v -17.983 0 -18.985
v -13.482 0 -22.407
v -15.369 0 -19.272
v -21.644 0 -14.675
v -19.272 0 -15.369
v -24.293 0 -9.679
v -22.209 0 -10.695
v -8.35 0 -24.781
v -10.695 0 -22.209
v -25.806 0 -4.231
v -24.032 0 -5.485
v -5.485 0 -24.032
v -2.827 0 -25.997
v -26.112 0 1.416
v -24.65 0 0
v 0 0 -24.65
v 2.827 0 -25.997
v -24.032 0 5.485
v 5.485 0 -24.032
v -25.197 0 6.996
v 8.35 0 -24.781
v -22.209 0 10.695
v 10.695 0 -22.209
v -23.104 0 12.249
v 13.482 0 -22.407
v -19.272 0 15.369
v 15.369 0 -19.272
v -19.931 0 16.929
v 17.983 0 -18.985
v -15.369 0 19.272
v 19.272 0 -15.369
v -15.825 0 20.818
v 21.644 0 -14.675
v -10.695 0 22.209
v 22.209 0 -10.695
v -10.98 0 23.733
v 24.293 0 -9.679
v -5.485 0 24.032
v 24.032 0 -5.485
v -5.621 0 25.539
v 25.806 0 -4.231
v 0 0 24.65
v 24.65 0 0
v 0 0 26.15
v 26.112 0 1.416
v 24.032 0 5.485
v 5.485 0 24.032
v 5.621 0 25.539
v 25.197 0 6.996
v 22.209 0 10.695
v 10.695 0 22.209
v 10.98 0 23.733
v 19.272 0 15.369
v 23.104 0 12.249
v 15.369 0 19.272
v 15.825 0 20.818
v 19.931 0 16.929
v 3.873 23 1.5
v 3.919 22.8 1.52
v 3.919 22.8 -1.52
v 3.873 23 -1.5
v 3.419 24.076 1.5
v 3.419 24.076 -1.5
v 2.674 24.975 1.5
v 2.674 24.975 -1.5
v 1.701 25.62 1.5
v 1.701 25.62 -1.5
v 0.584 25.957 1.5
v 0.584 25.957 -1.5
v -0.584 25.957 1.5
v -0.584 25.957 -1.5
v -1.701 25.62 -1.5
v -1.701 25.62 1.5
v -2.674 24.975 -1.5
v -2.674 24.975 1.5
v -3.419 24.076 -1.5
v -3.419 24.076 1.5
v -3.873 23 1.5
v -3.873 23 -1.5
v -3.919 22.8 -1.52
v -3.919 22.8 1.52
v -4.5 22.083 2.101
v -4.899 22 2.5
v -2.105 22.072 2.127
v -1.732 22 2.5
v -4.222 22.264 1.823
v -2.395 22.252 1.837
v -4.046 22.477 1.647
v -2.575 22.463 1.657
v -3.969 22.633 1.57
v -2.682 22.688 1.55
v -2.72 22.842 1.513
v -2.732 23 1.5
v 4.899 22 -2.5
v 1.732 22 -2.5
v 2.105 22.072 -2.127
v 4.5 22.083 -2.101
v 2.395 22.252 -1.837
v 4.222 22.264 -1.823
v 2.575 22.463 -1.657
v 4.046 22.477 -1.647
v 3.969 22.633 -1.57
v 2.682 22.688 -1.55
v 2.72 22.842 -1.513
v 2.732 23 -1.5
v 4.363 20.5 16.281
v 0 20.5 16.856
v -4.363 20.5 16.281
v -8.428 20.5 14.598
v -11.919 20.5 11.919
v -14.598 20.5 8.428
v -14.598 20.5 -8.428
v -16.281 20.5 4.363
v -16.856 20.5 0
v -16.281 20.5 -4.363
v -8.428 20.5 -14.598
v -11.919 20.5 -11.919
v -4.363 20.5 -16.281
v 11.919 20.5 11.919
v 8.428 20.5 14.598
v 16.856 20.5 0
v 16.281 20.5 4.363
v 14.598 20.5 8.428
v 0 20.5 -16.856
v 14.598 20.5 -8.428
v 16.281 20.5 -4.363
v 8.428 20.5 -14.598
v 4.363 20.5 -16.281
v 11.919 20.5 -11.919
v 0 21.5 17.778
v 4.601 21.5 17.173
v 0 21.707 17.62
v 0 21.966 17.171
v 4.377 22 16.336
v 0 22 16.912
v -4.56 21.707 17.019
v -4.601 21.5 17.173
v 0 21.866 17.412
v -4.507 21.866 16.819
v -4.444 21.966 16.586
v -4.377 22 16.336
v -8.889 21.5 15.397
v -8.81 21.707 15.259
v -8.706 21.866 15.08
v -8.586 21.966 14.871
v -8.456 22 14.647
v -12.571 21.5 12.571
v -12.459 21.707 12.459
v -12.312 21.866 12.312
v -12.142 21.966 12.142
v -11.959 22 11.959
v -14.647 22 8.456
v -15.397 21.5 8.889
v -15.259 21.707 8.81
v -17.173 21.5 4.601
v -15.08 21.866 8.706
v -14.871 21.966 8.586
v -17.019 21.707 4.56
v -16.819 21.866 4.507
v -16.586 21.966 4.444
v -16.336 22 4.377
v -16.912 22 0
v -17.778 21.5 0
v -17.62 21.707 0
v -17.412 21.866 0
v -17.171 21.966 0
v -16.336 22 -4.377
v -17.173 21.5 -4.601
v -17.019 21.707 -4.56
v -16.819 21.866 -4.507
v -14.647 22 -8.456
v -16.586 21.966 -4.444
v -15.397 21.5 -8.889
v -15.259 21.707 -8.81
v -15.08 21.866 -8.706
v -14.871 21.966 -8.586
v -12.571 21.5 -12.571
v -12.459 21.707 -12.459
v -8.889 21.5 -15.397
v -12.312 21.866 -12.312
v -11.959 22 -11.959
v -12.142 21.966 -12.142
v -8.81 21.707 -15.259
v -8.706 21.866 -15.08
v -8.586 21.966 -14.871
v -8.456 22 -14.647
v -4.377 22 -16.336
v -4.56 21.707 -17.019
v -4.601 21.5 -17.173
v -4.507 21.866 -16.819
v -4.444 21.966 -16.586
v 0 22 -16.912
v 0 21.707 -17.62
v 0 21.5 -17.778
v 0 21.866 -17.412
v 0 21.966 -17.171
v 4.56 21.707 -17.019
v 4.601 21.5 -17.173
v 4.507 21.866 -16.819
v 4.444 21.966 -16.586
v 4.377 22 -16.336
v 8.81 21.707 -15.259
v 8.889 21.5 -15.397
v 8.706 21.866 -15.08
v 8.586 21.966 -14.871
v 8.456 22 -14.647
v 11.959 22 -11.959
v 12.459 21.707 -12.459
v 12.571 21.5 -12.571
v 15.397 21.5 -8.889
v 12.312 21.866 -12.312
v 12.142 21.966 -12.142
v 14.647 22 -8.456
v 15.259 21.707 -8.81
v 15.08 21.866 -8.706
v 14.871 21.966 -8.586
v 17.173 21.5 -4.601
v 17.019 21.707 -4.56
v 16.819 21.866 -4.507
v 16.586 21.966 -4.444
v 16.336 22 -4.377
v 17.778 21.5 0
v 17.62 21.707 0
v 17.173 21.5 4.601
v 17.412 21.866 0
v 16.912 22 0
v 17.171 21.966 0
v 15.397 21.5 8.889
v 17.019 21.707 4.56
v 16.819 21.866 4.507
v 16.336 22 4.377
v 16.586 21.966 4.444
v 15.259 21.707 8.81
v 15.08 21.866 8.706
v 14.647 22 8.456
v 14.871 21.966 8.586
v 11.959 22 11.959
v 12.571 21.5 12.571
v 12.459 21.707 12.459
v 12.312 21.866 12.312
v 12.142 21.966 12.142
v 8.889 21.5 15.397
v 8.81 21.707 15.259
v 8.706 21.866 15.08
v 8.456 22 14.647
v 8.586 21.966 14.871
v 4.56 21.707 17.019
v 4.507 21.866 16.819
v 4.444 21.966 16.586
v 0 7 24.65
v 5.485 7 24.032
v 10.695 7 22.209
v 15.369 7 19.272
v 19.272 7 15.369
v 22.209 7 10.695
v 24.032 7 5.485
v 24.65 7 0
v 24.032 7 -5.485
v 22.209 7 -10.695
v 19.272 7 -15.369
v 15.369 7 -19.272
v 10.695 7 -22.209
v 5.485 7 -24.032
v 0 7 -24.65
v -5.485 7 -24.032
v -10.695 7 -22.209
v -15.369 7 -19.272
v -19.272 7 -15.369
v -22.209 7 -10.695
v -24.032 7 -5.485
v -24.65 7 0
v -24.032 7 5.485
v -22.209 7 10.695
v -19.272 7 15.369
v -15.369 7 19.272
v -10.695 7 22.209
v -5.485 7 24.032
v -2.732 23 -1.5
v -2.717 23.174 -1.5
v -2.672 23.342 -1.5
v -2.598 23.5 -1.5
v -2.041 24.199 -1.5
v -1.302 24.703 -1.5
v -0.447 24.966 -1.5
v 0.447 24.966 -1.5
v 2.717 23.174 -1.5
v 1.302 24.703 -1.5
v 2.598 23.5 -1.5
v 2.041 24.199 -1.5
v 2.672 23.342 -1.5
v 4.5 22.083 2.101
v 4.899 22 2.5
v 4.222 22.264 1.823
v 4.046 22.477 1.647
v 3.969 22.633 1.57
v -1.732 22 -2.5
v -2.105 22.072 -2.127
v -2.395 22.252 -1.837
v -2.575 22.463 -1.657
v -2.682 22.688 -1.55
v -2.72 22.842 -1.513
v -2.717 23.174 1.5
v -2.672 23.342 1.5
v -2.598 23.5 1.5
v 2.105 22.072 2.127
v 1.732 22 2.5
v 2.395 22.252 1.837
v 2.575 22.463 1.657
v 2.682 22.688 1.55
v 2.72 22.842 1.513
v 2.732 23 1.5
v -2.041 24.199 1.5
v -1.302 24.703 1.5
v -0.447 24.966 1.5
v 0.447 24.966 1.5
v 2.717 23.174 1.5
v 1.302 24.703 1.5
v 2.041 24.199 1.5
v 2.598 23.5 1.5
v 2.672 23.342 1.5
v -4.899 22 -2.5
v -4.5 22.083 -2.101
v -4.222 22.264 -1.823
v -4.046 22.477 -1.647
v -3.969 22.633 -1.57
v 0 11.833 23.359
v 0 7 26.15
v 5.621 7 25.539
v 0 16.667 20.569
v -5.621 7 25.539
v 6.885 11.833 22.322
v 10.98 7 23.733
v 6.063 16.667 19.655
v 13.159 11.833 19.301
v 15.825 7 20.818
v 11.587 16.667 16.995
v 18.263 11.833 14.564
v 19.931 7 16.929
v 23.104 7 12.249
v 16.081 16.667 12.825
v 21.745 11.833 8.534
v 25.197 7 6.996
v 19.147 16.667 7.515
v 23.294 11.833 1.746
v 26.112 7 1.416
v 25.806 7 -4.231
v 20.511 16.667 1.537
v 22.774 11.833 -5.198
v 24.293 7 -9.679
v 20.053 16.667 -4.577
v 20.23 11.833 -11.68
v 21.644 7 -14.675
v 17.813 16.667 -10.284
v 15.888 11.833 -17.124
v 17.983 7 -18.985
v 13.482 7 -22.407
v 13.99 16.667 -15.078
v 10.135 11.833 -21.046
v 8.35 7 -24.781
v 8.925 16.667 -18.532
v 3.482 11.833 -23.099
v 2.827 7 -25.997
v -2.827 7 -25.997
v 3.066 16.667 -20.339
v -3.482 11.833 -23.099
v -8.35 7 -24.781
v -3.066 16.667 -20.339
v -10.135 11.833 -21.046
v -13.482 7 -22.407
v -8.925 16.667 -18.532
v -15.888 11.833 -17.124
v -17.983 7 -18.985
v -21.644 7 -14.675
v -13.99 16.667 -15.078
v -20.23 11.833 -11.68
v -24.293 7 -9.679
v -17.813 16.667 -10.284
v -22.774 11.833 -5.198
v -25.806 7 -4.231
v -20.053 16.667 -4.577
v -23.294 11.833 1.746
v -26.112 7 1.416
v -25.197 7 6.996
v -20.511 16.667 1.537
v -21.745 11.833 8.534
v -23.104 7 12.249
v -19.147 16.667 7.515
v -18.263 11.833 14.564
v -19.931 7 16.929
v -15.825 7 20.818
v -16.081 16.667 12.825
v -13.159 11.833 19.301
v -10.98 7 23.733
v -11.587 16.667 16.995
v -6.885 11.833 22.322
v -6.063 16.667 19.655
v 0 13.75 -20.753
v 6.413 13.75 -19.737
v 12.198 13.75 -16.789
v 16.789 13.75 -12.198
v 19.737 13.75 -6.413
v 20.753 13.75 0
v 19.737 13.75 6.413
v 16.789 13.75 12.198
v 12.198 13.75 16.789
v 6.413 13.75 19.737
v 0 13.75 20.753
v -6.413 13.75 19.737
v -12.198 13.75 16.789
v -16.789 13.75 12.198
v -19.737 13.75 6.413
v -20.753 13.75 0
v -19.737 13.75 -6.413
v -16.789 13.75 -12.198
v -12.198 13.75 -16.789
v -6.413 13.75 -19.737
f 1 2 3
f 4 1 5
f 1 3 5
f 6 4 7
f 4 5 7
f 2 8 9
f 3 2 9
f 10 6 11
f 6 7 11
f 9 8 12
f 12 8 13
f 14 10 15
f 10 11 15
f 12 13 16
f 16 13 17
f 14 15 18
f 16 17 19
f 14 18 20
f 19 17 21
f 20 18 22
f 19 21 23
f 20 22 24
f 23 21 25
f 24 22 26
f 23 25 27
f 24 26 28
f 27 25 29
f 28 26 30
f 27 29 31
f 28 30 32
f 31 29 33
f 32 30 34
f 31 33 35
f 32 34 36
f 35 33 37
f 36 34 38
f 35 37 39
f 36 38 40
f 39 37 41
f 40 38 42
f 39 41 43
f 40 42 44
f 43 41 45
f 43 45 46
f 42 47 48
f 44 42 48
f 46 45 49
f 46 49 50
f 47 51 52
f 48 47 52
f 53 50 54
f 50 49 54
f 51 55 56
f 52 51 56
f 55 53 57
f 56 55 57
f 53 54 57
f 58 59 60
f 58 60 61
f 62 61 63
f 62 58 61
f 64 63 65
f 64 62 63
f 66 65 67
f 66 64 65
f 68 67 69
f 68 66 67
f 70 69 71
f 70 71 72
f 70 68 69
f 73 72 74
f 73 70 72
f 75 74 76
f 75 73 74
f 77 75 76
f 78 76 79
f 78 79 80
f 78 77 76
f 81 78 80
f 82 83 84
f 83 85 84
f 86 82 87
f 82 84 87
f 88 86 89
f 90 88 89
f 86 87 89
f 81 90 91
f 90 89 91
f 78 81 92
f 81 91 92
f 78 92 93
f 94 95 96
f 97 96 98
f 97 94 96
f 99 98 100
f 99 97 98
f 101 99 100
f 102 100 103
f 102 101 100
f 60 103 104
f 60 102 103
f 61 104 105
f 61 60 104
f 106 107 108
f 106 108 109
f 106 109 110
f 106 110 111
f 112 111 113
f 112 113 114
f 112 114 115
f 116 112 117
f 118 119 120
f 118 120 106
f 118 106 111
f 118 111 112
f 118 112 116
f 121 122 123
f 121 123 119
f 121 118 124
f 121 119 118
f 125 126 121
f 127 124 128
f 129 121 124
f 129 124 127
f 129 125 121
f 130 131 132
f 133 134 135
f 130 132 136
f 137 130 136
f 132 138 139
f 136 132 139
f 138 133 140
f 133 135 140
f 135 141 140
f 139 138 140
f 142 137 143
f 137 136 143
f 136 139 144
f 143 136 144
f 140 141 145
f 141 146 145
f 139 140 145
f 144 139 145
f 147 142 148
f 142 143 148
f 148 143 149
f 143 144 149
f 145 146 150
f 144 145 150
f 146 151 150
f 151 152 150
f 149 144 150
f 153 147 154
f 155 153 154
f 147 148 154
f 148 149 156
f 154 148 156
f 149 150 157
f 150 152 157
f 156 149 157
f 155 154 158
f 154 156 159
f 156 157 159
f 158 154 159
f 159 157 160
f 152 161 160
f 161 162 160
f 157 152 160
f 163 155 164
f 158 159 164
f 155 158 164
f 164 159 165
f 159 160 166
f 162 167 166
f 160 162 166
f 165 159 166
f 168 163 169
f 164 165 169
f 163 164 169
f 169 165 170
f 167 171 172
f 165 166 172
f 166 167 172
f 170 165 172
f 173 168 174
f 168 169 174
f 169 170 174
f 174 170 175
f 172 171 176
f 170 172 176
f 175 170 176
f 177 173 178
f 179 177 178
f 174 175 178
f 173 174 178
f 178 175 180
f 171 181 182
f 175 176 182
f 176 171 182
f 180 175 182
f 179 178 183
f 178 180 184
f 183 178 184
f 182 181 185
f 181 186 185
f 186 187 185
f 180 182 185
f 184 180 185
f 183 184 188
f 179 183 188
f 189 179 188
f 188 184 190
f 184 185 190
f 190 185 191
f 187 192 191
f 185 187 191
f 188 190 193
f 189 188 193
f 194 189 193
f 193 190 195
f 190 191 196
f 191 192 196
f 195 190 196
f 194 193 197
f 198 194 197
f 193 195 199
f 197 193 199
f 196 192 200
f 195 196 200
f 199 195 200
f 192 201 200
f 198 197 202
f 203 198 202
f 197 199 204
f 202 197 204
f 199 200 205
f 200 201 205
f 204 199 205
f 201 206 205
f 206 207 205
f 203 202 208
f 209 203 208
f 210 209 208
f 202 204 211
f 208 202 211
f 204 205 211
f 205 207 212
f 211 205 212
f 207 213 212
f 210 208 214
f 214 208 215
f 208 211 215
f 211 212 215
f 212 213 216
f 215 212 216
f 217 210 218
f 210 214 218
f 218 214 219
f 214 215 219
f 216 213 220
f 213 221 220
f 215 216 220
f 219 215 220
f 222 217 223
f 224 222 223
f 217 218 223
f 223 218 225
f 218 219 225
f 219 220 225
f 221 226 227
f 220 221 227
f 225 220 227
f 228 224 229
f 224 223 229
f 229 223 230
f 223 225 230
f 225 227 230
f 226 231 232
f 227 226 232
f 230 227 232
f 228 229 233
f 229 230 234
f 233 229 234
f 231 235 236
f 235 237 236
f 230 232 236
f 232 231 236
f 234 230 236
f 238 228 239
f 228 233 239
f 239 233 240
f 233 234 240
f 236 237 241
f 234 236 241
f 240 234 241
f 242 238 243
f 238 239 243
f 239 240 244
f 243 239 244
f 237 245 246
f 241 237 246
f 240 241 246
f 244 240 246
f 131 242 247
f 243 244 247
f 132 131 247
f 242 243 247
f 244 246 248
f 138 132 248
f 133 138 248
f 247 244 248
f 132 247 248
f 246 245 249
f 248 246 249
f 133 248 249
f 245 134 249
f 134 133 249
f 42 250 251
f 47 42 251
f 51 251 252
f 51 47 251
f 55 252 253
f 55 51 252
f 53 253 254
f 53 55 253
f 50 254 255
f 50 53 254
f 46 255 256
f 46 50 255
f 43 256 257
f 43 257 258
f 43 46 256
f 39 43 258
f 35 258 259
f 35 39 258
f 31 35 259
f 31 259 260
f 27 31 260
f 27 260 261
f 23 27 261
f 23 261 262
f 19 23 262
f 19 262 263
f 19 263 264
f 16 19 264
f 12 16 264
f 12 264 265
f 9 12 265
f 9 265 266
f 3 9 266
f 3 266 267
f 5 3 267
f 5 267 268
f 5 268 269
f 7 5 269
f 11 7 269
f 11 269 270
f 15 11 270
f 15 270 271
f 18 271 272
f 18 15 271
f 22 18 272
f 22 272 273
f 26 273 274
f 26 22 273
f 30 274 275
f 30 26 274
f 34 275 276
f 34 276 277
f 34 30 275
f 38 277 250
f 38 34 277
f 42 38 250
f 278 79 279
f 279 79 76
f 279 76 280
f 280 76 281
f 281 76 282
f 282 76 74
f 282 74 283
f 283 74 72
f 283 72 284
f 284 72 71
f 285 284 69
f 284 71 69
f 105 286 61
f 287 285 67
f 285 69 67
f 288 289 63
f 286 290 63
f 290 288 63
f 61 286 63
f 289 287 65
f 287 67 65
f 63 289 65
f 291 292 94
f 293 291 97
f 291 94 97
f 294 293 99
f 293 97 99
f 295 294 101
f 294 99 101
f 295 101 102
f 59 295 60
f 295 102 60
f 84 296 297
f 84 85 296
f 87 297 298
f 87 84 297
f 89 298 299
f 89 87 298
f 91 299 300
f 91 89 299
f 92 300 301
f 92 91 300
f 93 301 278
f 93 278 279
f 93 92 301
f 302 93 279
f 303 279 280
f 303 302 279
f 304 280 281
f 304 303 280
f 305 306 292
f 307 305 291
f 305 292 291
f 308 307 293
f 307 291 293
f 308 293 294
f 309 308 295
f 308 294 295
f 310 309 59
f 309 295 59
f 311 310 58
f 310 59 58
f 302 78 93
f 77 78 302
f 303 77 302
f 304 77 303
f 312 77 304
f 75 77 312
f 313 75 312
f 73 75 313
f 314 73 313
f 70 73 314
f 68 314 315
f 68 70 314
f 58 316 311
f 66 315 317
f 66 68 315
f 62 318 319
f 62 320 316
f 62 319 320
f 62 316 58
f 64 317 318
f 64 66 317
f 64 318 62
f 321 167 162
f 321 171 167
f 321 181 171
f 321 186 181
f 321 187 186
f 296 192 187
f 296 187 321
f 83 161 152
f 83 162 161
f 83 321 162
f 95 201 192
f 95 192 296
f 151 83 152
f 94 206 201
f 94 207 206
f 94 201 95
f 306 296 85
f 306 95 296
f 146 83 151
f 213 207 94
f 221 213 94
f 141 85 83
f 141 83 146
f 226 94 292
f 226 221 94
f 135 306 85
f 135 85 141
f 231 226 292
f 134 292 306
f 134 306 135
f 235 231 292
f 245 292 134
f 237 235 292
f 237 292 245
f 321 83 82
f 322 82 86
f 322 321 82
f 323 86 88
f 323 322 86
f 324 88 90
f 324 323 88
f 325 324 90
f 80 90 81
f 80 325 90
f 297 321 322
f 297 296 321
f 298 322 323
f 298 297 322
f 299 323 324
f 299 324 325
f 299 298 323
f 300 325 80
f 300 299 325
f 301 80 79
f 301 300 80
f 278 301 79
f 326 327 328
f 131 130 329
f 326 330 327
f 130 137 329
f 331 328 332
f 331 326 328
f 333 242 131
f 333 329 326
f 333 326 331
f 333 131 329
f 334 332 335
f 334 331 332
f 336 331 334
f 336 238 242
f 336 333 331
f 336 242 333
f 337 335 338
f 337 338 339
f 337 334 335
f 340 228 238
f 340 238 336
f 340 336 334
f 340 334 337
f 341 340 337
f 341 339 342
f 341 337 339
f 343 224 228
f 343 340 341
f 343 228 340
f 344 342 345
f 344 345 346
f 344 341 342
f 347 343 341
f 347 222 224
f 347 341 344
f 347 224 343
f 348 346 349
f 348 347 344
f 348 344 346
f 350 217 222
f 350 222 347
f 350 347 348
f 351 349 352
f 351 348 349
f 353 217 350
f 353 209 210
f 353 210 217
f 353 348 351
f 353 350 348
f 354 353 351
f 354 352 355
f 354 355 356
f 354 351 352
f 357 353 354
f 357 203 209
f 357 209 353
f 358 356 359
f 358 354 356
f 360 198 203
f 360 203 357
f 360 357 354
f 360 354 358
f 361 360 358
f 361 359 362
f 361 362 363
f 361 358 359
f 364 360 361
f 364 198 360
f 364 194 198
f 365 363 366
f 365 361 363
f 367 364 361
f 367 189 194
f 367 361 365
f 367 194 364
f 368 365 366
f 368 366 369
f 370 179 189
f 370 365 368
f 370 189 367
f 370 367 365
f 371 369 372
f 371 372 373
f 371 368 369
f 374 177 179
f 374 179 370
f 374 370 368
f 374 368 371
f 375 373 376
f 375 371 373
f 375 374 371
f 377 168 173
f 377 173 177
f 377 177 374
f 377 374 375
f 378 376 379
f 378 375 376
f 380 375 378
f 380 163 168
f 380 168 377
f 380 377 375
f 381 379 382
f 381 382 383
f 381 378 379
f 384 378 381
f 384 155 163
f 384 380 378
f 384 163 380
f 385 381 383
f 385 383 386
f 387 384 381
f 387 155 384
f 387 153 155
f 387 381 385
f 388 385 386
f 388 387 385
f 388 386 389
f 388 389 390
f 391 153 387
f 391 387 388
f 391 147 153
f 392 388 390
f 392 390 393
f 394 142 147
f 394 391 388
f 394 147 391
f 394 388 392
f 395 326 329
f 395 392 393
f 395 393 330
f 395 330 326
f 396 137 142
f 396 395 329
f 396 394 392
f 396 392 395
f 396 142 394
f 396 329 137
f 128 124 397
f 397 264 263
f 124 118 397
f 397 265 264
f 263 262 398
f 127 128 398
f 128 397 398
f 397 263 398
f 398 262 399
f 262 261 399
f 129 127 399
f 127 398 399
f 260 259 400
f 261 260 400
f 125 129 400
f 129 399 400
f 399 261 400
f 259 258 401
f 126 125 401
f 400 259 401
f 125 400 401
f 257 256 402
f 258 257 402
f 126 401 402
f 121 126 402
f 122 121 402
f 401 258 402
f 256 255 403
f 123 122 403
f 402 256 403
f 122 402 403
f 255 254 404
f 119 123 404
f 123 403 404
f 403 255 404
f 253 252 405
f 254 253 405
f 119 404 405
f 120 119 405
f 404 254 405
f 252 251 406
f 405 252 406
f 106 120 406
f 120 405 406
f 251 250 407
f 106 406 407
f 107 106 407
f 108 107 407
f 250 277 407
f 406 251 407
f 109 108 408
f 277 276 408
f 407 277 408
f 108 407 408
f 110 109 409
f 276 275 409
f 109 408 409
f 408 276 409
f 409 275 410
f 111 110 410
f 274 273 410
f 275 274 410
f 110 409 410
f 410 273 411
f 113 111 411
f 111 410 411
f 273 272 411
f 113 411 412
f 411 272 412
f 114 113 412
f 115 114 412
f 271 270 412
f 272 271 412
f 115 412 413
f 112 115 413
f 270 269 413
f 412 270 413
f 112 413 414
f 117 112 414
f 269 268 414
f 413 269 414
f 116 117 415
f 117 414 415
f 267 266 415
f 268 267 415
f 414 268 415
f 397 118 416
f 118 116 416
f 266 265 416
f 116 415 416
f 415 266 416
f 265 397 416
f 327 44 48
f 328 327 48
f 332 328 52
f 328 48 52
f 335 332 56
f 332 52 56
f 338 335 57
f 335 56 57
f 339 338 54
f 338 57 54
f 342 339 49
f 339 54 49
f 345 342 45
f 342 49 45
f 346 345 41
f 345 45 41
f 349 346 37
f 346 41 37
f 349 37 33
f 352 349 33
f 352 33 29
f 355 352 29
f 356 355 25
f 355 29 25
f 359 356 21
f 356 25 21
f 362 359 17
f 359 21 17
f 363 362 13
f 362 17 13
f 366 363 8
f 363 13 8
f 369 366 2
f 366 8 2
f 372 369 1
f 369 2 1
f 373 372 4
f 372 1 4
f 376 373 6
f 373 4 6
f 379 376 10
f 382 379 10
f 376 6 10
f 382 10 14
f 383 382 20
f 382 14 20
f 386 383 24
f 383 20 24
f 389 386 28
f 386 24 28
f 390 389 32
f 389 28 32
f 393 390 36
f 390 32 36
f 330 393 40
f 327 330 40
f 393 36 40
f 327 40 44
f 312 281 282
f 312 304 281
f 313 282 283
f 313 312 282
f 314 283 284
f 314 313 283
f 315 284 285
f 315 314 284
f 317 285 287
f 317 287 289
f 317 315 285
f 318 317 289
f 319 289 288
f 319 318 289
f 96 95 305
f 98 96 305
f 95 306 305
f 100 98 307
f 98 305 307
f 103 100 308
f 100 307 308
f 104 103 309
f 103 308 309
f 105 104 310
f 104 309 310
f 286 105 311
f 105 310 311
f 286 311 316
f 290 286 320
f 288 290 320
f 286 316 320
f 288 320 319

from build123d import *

# Parameters (mm, degrees)
SKETCH1_R           = 26.15
SKETCH1_R_2         = 24.65
BOSS_EXTRUDE1_DEPTH = 7
SKETCH3_R           = 26.15
BOSS_EXTRUDE2_DEPTH = 15
BOSS_EXTRUDE2_TAPER = 30
SKETCH4_R           = 24.65
CUT_EXTRUDE1_DEPTH  = 13.5
CUT_EXTRUDE1_DRAFT  = -30
BOSS_EXTRUDE4_DEPTH = 1.5
FILLET2_R           = 1


with BuildPart() as part:
    # Sketch1 → Boss-Extrude1 (new body)
    with BuildSketch(Plane(origin=(0, 0, 0), x_dir=(1, 0, 0), z_dir=(0, 1, 0))):
        with Locations(Location((0, 0, 0), (0, 0, 270))):
            Circle(SKETCH1_R)
        with Locations(Location((0, 0, 0), (0, 0, 270))):
            Circle(SKETCH1_R_2, mode=Mode.SUBTRACT)
    extrude(amount=BOSS_EXTRUDE1_DEPTH)

    # Sketch3 → Boss-Extrude2 (add)
    with BuildSketch(Plane(origin=(0, 7, 0), x_dir=(1, 0, 0), z_dir=(0, 1, 0))):
        with Locations(Location((0, 0, 0), (0, 0, 270))):
            Circle(SKETCH3_R)
    extrude(amount=BOSS_EXTRUDE2_DEPTH, taper=BOSS_EXTRUDE2_TAPER)


with BuildPart() as cut_extrude1_tool:
    # Sketch4 → Cut-Extrude1 (with draft: the straight prism first)
    with BuildSketch(Plane.XZ.offset(-7)):
        with Locations(Location((0, 0, 0), (0, 0, 270))):
            Circle(SKETCH4_R)
    extrude(amount=-CUT_EXTRUDE1_DEPTH)
    # Cut-Extrude1: the draft: its side faces are tilted about the plane it starts from
    cut_extrude1_sides = [cut_extrude1_tool.faces().sort_by_distance(p)[0] for p in [
        (0, 13.75, 24.65),
    ]]
    draft(cut_extrude1_sides, Plane.XZ.offset(-7), CUT_EXTRUDE1_DRAFT)


with BuildPart() as part_1:
    add(part.part)

    # Cut-Extrude1: cut by cut_extrude1_tool
    add(cut_extrude1_tool.part, mode=Mode.SUBTRACT)

    # Sketch5 → Boss-Extrude4 (add, symmetric)
    with BuildSketch(Plane.XY):
        with BuildLine():
            Line((-4, 22), (-3, 22))
            ThreePointArc((-3, 22), (0, 25), (3, 22))
            Line((3, 22), (4, 22))
            ThreePointArc((4, 22), (0, 26), (-4, 22))
        make_face()
    extrude(amount=BOSS_EXTRUDE4_DEPTH, both=True)

    # Fillet2
    fillet2_edges = [part_1.edges().sort_by_distance(p)[0] for p in [
        (0, 22, -17.489745962),
        (4, 22, 0),
        (-3.5, 22, -1.5),
        (-4, 22, 0),
        (-3, 22, 0),
        (3.5, 22, -1.5),
        (3, 22, 0),
        (-3.5, 22, 1.5),
        (3.5, 22, 1.5),
    ]]
    fillet(fillet2_edges, radius=FILLET2_R)


solid = part_1.part
